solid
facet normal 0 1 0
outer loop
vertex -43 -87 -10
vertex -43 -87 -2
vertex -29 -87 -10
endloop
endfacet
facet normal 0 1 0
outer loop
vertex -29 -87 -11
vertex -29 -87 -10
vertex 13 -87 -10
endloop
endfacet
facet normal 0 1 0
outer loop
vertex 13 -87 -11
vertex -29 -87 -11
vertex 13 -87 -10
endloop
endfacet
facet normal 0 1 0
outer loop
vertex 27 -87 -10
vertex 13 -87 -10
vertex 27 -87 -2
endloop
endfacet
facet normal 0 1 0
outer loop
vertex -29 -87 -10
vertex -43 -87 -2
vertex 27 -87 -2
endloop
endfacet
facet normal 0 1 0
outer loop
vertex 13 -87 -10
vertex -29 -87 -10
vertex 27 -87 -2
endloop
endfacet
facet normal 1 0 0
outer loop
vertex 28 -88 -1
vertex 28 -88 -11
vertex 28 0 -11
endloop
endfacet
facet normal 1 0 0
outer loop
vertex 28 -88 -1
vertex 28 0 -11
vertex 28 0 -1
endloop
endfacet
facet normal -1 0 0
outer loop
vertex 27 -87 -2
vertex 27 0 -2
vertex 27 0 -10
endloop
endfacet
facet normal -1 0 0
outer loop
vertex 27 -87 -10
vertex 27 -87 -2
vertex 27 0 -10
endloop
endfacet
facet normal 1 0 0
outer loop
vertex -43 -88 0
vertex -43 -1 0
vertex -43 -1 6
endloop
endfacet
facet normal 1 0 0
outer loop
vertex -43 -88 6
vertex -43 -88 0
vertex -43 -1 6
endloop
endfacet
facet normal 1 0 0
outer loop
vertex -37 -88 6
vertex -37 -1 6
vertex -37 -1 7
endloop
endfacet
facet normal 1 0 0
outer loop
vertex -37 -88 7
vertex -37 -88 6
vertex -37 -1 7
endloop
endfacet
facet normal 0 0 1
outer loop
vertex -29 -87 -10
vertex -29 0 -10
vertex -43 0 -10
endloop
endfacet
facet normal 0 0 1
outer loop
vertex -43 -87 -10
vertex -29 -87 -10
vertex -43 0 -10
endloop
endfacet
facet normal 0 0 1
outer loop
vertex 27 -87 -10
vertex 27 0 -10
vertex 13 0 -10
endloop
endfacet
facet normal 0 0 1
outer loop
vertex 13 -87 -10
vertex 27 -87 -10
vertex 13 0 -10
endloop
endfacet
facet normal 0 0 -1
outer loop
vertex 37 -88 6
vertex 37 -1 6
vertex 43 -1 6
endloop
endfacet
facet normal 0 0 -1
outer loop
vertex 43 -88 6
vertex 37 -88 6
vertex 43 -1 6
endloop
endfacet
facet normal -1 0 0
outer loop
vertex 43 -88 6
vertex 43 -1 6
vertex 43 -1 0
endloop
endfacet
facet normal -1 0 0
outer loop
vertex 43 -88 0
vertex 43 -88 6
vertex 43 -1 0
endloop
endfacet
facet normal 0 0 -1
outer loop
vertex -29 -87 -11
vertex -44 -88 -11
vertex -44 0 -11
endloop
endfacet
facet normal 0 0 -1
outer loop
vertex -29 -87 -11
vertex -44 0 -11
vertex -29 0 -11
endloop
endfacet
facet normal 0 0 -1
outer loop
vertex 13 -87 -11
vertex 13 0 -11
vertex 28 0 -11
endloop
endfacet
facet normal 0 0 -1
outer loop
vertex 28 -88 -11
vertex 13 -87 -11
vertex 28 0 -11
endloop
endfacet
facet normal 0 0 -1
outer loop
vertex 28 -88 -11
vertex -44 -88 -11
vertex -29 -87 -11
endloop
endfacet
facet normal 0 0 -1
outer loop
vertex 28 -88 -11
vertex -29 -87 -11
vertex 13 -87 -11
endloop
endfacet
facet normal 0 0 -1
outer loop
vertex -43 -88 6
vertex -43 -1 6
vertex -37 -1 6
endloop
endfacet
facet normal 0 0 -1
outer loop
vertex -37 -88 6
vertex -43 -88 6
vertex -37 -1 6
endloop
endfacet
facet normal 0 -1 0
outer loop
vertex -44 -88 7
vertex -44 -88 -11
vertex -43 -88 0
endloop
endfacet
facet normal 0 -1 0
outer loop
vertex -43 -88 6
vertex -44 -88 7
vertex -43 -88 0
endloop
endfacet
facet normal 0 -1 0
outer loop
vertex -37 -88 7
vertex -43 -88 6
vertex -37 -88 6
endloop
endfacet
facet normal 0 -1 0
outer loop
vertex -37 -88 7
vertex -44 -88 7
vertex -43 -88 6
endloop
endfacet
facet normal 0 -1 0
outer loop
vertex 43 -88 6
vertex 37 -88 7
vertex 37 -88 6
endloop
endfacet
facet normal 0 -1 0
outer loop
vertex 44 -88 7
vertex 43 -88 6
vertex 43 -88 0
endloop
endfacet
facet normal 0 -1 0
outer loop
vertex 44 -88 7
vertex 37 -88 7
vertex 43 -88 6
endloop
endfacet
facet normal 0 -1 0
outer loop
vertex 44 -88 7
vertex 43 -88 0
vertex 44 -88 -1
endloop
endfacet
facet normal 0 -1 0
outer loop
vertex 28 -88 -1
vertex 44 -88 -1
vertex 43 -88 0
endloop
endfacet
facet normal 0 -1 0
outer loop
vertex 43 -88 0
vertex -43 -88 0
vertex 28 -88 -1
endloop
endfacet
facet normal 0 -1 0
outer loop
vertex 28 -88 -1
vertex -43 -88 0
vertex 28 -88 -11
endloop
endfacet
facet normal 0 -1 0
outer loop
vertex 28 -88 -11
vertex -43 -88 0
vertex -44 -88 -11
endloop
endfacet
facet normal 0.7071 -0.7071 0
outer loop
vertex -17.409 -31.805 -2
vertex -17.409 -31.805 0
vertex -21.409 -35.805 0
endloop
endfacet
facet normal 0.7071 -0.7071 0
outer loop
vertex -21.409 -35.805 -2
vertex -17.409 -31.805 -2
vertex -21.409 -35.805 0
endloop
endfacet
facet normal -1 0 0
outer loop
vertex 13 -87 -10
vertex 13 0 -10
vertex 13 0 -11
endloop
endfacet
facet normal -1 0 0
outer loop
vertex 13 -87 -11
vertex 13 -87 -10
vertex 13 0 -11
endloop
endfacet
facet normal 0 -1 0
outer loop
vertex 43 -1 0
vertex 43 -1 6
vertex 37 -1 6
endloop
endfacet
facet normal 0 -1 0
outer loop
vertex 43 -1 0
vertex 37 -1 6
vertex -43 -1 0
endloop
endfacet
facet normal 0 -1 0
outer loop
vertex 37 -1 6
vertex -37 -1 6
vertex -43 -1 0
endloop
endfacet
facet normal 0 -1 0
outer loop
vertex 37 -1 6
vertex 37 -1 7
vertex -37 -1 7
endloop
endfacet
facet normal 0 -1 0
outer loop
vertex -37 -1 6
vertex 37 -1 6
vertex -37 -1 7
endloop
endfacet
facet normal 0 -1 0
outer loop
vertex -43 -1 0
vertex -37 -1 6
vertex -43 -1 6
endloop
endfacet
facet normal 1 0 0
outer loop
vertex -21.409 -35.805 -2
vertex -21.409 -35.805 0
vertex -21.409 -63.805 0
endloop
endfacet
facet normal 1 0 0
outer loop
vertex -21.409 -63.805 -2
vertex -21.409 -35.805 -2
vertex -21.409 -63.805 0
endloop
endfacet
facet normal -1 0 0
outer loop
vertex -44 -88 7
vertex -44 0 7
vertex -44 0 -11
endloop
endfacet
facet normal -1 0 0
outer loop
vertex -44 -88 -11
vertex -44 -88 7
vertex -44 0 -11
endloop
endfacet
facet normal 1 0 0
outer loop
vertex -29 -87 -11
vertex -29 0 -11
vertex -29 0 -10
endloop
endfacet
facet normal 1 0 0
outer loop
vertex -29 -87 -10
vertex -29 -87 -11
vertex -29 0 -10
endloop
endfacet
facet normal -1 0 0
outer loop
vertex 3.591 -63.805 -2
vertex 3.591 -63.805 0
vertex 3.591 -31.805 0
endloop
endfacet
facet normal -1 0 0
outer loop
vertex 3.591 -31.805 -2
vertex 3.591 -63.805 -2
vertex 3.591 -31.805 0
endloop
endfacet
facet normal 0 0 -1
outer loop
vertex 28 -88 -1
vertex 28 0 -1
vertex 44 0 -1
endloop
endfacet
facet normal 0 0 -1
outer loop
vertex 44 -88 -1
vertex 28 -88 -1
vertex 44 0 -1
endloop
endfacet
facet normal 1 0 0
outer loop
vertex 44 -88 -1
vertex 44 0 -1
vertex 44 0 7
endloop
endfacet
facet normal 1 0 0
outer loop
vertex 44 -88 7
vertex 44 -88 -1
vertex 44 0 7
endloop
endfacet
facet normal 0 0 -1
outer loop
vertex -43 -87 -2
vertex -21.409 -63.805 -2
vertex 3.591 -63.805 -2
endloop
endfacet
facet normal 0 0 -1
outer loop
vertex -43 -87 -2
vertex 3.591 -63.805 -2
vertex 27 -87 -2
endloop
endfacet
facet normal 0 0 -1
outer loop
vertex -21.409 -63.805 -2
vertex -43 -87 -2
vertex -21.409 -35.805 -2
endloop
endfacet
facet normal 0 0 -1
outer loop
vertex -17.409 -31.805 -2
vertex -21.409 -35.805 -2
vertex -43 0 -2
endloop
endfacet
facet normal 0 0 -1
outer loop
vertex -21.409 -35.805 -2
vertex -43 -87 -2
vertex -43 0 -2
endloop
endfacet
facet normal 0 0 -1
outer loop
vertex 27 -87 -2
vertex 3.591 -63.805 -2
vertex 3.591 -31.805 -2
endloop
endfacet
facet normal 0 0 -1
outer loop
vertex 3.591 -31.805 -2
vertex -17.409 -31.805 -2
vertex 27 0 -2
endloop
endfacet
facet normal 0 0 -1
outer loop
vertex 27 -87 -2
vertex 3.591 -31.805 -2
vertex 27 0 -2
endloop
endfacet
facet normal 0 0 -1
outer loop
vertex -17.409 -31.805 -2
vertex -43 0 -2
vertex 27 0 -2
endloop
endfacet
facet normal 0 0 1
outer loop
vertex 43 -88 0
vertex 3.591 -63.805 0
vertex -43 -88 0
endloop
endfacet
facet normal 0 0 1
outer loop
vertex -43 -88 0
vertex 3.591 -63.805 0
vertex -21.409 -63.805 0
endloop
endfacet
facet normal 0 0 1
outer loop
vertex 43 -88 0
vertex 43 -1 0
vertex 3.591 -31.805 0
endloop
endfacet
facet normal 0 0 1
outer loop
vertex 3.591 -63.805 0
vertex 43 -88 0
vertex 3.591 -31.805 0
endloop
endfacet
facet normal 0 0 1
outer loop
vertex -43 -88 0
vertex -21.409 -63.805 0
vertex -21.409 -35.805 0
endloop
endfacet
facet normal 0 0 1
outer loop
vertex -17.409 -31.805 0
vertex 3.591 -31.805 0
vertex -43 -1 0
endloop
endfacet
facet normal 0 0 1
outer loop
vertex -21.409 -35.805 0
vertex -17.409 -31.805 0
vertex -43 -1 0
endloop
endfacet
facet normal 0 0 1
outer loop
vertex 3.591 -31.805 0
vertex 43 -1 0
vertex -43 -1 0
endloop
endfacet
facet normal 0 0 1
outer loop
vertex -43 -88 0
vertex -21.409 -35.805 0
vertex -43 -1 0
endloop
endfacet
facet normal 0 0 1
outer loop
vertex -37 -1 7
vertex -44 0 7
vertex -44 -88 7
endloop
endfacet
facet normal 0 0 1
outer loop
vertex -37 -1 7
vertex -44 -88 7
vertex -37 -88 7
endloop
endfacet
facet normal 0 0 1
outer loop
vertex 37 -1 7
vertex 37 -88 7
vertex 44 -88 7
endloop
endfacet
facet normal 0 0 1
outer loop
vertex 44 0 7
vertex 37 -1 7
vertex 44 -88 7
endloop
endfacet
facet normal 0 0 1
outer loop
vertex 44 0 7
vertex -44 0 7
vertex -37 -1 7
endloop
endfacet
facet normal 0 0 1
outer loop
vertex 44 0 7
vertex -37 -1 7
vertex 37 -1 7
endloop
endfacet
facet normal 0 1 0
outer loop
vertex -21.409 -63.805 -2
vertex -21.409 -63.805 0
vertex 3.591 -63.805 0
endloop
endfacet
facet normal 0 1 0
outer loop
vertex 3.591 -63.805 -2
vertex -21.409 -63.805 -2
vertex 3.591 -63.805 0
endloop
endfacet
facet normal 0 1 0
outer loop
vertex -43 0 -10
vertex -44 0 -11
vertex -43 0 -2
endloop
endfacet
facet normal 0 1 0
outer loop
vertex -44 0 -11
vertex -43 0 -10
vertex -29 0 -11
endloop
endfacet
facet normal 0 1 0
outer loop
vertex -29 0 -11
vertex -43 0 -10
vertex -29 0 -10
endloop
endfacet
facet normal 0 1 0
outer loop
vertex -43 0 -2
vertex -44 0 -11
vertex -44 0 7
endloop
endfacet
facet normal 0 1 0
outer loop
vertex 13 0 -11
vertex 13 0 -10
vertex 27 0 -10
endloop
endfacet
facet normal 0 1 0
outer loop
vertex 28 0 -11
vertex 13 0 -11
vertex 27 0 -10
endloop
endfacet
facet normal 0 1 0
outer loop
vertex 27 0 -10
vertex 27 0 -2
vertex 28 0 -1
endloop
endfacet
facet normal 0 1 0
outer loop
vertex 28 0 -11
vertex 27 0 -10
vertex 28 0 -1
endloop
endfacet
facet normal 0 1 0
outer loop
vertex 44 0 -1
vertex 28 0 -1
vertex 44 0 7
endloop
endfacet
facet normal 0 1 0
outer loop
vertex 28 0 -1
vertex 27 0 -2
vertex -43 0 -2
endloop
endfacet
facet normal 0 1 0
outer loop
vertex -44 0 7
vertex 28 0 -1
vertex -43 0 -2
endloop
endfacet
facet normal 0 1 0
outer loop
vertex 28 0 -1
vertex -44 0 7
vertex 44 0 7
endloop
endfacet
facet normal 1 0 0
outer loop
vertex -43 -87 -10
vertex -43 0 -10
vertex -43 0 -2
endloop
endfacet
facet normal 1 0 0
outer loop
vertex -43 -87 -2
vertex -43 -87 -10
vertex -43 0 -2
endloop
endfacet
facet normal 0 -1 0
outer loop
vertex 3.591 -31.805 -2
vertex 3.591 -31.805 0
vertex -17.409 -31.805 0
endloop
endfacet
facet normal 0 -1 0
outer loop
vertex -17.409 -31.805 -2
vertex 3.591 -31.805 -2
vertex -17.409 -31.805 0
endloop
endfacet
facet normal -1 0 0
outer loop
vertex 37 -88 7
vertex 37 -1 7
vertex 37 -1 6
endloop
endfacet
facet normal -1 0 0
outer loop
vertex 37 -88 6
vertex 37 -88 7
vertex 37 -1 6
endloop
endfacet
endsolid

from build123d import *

# Parameters (mm, degrees)
F1_DEPTH = 88
F3_DEPTH = 1
F4_DEPTH = 88
F6_DEPTH = 1
F8_DEPTH = 2


with BuildPart() as f1:
    # F0 (on Front) → F1 (new body)
    with BuildSketch(Plane.XZ):
        Polygon((43, 0), (0, 0), (-43, 0), (-43, 6), (-37, 6), (-37, 7), (-44, 7), (-44, -1), (0, -1), (28, -1), (44, -1), (44, 7), (37, 7), (37, 6), (43, 6), align=None)
    extrude(amount=F1_DEPTH)

    # F2 (on face) → F3 (join)
    with BuildSketch(Plane(origin=(0, 0, 0), x_dir=(-1, 0, 0), z_dir=(0, 1, 0))):
        Polygon((37, 7), (-37, 7), (-37, 6), (-43, 6), (-43, 0), (43, 0), (43, 6), (37, 6), align=None)
    extrude(amount=-F3_DEPTH)

    # F0 (on Front) → F4 (join)
    with BuildSketch(Plane.XZ):
        Polygon((0, -1), (-44, -1), (-44, -11), (-29, -11), (-29, -10), (-43, -10), (-43, -2), (0, -2), (27, -2), (27, -10), (13, -10), (13, -11), (28, -11), (28, -2), (28, -1), align=None)
    extrude(amount=F4_DEPTH)

    # F5 (on face) → F6 (join)
    with BuildSketch(Plane.XZ.offset(88)):
        Polygon((-29, -10), (-29, -11), (13, -11), (13, -10), (27, -10), (27, -2), (-43, -2), (-43, -10), align=None)
    extrude(amount=-F6_DEPTH)

    # F7 (on Top) → F8 (cut)
    with BuildSketch(Plane.XY):
        Polygon((-21.4086160213, -63.8053458929), (3.5913839787, -63.8053458929), (3.5913839787, -31.8053458929), (-17.4086160213, -31.8053458929), (-21.4086160213, -35.8053458929), align=None)
    extrude(amount=-F8_DEPTH, mode=Mode.SUBTRACT)


solid = f1.part
